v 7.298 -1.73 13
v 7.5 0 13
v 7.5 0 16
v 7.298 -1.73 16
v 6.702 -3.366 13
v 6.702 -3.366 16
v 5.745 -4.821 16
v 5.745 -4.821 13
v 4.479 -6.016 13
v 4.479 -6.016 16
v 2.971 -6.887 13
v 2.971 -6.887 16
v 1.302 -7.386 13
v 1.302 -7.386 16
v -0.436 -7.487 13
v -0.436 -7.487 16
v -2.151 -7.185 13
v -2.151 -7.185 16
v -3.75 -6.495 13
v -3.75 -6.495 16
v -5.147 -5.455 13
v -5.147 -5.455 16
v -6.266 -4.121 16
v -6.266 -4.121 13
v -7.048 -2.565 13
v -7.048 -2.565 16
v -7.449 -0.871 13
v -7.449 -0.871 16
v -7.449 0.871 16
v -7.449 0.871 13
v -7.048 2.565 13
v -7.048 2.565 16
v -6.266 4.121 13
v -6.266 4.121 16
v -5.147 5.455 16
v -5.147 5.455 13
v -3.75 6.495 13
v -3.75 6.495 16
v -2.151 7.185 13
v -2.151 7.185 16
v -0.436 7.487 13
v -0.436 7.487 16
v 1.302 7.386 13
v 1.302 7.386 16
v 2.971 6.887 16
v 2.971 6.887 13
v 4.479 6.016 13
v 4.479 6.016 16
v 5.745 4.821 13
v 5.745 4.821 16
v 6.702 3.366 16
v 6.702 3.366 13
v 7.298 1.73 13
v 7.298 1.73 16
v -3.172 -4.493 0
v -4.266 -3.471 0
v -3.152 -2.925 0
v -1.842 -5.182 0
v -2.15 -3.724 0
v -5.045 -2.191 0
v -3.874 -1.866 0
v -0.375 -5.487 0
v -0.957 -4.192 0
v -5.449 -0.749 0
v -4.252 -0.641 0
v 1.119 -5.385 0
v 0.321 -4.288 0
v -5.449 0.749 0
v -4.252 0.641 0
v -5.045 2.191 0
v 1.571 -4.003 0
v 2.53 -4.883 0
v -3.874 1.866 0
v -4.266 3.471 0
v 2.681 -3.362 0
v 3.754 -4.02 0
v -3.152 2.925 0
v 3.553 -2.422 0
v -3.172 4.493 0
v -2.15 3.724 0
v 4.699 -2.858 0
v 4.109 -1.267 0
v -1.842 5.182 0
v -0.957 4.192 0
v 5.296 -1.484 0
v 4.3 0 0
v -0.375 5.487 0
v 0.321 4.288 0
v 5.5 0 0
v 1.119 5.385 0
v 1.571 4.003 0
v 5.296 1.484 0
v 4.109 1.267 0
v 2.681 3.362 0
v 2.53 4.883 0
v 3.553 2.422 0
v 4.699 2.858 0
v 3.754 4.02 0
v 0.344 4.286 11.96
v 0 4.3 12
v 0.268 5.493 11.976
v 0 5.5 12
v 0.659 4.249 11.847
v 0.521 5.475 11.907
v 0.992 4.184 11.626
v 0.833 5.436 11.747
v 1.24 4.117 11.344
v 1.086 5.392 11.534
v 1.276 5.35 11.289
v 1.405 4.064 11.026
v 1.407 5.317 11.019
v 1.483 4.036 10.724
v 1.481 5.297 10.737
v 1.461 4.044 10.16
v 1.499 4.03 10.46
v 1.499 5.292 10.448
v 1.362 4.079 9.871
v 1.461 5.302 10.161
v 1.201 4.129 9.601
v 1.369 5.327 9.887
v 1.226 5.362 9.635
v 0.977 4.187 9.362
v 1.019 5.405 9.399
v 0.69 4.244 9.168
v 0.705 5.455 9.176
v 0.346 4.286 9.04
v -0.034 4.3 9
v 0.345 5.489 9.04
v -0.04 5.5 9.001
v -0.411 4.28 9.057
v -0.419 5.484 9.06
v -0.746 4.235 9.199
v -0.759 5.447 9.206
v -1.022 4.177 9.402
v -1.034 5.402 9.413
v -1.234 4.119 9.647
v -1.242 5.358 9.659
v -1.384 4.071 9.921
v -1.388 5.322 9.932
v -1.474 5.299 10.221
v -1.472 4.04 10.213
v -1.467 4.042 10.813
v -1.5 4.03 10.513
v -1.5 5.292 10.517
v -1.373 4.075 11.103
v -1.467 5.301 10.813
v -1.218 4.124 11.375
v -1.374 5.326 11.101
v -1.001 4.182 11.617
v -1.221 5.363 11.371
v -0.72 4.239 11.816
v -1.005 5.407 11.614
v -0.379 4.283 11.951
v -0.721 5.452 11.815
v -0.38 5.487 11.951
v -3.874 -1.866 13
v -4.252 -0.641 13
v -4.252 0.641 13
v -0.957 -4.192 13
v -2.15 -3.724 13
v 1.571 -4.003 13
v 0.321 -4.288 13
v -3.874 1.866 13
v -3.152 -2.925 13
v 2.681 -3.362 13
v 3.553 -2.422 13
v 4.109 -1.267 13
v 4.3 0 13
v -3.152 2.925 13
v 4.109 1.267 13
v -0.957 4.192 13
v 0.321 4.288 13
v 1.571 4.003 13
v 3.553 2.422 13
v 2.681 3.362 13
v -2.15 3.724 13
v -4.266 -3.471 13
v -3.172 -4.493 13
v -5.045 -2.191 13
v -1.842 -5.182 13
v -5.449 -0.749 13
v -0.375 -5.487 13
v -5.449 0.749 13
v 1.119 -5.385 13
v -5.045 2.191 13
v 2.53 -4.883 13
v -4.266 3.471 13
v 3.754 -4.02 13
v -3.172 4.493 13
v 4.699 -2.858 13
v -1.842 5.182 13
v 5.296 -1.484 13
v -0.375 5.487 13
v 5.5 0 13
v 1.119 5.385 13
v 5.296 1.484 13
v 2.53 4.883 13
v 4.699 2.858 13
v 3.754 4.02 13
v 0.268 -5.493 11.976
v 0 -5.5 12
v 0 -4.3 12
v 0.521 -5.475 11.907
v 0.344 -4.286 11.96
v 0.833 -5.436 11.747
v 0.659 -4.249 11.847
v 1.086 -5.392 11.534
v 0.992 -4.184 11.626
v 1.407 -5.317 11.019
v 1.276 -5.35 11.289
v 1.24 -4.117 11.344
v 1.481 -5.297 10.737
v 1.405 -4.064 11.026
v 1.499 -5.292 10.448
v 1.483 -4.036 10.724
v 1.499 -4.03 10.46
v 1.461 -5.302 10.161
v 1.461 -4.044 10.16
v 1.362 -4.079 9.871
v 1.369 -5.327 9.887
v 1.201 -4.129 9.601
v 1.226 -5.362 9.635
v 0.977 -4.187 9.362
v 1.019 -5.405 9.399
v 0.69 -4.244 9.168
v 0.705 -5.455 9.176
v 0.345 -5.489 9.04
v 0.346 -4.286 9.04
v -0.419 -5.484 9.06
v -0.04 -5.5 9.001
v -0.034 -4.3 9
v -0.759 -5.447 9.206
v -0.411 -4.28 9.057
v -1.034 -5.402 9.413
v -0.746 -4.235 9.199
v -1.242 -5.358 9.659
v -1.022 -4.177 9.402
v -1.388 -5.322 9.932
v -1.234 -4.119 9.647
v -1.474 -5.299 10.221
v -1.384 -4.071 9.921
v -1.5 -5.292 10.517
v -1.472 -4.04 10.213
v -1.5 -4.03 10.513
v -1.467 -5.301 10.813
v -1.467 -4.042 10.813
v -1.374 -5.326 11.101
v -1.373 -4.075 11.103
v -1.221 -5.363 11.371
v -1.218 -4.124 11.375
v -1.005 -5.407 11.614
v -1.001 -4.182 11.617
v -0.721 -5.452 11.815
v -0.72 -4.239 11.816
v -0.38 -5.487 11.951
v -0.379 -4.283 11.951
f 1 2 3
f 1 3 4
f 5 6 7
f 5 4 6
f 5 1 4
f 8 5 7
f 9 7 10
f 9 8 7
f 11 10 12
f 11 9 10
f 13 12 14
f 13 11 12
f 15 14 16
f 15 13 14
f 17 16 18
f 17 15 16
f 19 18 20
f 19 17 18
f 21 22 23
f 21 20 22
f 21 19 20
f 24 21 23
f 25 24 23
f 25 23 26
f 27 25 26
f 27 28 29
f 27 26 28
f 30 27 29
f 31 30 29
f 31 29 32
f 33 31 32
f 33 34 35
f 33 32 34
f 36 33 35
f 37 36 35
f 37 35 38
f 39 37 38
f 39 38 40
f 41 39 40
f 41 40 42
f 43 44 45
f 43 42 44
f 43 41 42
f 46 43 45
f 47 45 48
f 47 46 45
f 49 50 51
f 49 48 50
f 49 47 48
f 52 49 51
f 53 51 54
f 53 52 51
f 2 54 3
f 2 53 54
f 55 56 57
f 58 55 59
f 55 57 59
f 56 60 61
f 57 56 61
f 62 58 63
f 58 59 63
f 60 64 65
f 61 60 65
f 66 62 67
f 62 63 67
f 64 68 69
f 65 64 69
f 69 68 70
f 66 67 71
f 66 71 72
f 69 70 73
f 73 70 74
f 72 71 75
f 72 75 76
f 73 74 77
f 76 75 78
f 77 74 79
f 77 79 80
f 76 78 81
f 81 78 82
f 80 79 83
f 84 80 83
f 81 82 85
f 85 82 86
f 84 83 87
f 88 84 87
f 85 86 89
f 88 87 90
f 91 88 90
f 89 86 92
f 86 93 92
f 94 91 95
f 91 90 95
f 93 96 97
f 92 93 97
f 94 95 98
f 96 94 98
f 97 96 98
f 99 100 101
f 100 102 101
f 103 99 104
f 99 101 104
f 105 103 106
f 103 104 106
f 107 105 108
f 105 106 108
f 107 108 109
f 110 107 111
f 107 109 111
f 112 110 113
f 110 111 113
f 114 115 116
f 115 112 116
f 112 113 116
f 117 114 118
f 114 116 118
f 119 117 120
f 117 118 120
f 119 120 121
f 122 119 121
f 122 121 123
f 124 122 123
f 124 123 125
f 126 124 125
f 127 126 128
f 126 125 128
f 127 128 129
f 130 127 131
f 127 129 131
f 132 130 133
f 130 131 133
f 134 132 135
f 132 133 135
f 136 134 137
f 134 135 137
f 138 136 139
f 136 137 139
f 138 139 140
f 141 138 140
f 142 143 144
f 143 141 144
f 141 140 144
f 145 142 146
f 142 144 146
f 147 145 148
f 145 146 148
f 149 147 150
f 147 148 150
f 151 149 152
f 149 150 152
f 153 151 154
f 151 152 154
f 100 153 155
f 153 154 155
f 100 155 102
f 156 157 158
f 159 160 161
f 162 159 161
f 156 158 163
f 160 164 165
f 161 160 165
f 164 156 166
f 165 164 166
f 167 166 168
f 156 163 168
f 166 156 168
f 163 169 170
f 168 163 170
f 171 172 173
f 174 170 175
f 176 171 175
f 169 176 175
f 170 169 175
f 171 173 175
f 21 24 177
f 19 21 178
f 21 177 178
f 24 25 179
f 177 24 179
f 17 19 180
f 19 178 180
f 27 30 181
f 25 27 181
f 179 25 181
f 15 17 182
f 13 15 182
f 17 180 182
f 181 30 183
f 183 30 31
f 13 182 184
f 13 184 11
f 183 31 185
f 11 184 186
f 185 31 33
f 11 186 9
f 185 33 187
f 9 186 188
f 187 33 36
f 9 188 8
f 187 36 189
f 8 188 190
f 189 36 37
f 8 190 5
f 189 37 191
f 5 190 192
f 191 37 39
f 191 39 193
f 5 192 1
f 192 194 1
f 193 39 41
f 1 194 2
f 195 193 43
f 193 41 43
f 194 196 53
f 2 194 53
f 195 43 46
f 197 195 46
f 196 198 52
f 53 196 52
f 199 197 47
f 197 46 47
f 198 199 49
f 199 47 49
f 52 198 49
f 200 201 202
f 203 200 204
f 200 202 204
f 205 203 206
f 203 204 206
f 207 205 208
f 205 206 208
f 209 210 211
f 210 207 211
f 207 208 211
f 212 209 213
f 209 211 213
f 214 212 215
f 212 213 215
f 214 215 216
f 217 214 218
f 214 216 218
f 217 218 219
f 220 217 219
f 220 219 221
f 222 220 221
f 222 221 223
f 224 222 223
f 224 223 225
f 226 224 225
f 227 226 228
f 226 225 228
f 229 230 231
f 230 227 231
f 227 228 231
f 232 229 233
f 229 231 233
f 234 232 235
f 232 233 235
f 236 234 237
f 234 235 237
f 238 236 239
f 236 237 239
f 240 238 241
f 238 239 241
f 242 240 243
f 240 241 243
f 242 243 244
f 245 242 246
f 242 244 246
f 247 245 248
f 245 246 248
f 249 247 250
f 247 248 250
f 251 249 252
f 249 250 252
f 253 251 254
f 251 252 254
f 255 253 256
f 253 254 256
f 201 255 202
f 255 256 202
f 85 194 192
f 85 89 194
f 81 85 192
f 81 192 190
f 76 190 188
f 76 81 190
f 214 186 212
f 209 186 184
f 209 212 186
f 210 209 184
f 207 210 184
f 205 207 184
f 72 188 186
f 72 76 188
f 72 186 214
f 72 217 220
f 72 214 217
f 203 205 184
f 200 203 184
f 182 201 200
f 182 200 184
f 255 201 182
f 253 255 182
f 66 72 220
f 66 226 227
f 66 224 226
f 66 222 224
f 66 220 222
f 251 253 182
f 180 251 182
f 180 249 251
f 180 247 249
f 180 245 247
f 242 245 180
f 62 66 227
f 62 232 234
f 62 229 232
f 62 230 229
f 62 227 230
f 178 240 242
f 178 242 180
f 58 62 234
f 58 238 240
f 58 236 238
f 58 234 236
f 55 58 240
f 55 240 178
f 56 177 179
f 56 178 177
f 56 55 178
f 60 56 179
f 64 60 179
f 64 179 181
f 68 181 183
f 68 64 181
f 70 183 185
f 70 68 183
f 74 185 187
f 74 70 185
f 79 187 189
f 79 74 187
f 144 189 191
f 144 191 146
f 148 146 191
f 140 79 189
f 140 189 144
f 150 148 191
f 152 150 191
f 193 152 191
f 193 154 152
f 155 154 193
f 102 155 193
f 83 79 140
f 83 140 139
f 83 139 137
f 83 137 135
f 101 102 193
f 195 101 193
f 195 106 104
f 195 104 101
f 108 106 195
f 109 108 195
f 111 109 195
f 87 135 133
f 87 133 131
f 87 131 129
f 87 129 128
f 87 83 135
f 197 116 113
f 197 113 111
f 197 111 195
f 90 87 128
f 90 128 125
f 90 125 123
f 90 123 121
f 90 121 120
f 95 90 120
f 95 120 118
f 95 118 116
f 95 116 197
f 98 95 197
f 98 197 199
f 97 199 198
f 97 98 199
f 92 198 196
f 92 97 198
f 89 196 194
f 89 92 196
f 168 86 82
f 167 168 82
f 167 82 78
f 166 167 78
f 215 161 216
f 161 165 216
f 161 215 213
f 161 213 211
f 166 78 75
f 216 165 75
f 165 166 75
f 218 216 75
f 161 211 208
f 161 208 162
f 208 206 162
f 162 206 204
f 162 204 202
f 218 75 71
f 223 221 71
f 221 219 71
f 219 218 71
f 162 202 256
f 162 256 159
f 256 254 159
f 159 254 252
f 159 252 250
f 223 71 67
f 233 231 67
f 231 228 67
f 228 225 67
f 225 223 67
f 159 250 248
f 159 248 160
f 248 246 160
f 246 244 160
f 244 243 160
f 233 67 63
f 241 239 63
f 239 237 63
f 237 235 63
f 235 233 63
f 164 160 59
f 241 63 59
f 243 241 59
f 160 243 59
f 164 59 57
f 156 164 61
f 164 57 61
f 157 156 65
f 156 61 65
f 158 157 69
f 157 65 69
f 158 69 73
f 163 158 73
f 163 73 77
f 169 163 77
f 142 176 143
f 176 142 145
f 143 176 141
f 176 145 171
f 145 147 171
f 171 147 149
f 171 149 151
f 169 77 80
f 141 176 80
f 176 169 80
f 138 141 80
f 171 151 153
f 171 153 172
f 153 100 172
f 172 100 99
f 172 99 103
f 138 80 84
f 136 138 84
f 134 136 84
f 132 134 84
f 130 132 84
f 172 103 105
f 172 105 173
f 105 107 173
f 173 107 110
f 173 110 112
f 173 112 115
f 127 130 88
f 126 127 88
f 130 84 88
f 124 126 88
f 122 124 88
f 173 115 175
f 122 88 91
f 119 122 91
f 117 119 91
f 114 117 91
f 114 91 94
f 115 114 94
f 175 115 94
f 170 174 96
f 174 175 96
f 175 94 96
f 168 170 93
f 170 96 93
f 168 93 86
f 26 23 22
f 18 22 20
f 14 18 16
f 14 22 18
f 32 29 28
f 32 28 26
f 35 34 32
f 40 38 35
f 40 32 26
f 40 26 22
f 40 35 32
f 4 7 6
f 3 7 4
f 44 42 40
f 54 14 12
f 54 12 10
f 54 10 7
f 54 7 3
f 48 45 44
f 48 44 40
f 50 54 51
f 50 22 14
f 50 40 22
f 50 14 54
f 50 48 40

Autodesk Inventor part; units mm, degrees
ref_plane "YZ Plane" through (0, 0, 0) normal (1, 0, 0) x (0, 1, 0)
ref_plane "XZ Plane" through (0, 0, 0) normal (0, 1, 0) x (-1, 0, 0)
ref_plane "XY Plane" through (0, 0, 0) normal (0, 0, 1) x (1, 0, 0)
sketch "스케치1" plane through (0, 0, 0) normal (0, 0, 1) x (1, 0, 0)
  circle A0 centre (0, 0) radius 5.5
  circle A1 centre (0, 0) radius 4.3
  dimension "d0" = 11
  dimension "d1" = 8.6
extrude "돌출1" add sketch "스케치1" along normal blind 13
sketch "스케치2" plane through (0, 0, 13) normal (0, 0, 1) x (1, 0, 0)
  circle A0 centre (0, 0) radius 4.3 projected
  circle A1 centre (0, 0) radius 7.5
  dimension "d4" = 15
extrude "돌출2" add sketch "스케치2" along normal blind 3 contours A0 | A1
sketch "스케치3" plane through (0, 0, 0) normal (1, 0, 0) x (0, 1, 0)
  line L0 (7.4799, 10.5) -> (-8.5589, 10.5)
  line L1 (-8.5589, 10.5) -> (-8.5589, 12)
  line L2 (-8.5589, 12) -> (7.4799, 12)
  line L3 (7.4799, 12) -> (7.4799, 10.5)
  line L4 (7.5, 13) -> (-7.5, 13) projected
  point P0 (0, 0)
  dimension "d7" = 1.5
  dimension "d10" = 2.5
revolve "회전1" cut sketch "스케치3" angle 360 about axis through (0, 7.4799, 10.5) along (0, -1, 0)
properties part number "SAFRS-P-0060"
